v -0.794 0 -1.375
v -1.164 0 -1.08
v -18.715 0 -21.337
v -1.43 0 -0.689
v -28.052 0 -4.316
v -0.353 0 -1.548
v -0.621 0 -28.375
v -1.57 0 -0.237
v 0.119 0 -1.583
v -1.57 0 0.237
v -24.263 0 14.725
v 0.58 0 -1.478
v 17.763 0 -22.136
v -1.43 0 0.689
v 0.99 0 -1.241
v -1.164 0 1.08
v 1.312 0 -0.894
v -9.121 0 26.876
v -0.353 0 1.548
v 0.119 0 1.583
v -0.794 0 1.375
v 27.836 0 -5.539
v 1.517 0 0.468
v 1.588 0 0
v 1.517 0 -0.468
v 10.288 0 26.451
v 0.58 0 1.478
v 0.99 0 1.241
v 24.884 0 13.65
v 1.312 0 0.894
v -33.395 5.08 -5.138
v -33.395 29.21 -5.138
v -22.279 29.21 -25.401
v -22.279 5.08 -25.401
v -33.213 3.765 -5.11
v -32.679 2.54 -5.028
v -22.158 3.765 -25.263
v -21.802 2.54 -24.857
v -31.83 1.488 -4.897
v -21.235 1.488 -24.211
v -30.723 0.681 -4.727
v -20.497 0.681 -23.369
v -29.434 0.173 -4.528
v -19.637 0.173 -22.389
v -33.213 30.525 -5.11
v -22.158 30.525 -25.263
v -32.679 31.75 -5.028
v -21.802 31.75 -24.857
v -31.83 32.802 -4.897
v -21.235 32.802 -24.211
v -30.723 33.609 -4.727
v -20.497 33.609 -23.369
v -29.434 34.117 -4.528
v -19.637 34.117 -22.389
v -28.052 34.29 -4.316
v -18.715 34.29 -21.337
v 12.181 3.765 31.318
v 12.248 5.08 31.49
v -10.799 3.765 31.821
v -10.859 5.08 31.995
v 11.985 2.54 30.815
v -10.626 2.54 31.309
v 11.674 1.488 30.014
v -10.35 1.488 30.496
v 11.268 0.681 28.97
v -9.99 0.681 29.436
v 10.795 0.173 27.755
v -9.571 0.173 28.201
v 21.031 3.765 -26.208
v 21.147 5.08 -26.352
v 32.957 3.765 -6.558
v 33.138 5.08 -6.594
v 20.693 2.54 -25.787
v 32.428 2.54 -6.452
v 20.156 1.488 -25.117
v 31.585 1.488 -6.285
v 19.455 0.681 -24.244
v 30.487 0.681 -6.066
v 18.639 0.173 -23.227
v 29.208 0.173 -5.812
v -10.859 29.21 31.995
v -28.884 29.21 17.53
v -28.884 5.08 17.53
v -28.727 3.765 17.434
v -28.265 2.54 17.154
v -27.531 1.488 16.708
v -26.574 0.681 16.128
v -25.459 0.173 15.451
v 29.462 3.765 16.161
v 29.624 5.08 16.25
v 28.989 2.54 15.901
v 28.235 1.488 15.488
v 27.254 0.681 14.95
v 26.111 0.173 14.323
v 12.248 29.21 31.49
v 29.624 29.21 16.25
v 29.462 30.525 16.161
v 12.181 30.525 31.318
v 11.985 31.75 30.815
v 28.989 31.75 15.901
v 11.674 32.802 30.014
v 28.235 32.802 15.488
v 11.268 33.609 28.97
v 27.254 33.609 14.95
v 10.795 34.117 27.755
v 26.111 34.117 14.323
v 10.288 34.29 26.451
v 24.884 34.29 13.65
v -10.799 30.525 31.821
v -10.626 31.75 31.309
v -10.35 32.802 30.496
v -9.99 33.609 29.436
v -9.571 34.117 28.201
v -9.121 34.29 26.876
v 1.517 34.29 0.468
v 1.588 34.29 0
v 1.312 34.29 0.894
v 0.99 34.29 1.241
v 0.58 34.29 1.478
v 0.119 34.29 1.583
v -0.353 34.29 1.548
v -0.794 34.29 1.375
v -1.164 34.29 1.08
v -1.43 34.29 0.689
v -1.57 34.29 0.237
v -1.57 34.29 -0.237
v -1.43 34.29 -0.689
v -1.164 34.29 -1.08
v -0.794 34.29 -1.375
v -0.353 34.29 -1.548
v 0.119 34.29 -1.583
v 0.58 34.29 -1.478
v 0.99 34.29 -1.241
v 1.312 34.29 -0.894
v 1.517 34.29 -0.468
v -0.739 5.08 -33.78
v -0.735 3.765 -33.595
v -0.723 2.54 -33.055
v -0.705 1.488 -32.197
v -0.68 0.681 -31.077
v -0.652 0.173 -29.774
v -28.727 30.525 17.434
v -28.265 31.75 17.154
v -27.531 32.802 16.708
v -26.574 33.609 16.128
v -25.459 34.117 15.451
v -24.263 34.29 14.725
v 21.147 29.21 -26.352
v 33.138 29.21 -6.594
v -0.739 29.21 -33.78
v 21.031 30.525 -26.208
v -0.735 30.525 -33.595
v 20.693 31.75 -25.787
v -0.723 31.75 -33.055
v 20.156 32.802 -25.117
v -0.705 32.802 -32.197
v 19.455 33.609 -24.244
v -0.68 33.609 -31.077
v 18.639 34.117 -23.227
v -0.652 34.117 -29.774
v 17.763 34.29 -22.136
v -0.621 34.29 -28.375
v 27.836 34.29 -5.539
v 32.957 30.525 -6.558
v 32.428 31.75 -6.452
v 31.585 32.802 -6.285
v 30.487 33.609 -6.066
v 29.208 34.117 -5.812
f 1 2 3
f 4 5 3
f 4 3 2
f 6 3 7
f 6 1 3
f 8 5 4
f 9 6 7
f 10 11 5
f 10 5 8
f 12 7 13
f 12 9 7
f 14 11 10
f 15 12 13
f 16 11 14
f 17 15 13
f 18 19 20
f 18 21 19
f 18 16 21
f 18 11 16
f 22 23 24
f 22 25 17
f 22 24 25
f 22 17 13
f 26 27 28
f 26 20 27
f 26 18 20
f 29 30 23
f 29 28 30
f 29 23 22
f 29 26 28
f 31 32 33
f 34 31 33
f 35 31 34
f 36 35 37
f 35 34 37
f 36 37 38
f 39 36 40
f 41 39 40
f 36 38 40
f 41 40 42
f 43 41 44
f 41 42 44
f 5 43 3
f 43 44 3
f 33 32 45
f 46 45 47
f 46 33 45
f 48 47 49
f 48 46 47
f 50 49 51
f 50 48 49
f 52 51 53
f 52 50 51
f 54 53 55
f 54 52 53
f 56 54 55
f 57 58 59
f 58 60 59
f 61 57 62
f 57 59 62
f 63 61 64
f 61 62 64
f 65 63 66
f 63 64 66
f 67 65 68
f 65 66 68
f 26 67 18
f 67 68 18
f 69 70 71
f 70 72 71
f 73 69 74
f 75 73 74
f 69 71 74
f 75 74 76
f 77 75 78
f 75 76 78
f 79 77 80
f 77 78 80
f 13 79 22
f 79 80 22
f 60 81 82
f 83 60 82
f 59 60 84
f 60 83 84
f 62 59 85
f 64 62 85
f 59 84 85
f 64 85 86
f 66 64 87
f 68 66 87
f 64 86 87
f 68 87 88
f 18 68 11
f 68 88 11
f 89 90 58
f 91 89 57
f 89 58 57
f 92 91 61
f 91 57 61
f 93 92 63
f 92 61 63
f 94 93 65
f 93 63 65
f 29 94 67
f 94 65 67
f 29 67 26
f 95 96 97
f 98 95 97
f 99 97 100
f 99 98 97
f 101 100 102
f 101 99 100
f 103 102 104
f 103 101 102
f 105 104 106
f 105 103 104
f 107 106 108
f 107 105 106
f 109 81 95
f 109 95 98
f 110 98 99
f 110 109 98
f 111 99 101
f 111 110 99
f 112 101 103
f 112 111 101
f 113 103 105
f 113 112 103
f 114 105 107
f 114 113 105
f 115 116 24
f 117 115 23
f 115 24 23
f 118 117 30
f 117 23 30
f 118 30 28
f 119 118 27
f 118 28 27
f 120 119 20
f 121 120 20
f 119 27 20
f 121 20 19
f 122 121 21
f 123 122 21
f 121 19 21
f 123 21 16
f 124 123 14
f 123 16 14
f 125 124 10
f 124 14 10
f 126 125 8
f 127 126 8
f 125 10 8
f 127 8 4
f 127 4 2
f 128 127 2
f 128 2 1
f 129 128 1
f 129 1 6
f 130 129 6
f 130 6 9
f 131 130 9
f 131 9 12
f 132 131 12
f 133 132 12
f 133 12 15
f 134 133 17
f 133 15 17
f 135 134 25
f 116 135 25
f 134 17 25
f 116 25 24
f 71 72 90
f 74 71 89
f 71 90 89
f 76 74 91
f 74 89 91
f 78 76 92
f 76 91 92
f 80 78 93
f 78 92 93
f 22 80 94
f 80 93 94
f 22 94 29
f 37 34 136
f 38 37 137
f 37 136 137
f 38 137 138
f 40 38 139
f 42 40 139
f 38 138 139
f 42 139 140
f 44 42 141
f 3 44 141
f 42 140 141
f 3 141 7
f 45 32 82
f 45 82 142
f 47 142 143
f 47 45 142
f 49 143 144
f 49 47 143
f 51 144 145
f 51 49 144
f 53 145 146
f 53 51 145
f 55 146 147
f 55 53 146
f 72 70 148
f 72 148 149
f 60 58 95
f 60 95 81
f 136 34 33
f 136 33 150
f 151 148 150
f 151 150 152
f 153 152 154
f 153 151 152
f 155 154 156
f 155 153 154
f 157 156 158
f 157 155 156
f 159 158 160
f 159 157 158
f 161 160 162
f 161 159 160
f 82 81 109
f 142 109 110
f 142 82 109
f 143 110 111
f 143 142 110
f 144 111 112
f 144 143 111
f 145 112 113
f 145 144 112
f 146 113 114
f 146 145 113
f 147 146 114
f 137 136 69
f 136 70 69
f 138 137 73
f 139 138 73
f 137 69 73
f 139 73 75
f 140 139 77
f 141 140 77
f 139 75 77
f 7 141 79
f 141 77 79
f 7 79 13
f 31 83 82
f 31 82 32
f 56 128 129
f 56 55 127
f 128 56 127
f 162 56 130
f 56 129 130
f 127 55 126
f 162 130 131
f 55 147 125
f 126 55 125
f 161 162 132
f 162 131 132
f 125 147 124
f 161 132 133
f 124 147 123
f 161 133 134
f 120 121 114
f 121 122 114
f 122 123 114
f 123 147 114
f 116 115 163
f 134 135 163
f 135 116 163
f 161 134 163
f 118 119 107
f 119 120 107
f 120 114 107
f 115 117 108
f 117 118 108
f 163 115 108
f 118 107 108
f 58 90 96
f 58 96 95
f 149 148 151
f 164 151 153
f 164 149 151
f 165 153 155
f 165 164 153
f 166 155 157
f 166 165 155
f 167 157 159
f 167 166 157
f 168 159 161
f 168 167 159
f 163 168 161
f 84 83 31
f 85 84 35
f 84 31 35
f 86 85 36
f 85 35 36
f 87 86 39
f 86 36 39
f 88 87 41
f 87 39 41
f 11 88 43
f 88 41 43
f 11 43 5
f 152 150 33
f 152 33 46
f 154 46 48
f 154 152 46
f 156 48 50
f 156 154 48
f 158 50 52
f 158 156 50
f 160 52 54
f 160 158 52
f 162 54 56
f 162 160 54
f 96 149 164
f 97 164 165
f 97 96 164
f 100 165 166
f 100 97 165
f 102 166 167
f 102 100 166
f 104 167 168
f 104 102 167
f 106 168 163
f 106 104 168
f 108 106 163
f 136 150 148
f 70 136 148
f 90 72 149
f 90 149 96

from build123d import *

# Parameters (mm, degrees)
F0_R     = 1.5875
F1_DEPTH = 34.29
F2_R     = 5.08


with BuildPart() as f1:
    # F0 (on Front) → F1 (new body)
    with BuildSketch(Plane.XZ):
        Polygon((29.623586, 16.249556), (12.24797, 31.489556), (-10.858607, 31.995243), (-28.884321, 17.53), (-33.39474, -5.137725), (-22.27939, -25.401451), (-0.739265, -33.779556), (21.14677, -26.351831), (33.137997, -6.593792), align=None)
        Circle(F0_R, mode=Mode.SUBTRACT)
    extrude(amount=-F1_DEPTH)

    # F2
    f2_edges = [f1.edges().sort_by_distance(p)[0] for p in [
        (-31.139531, 0, 6.196138),
        (-27.837065, 0, -15.269588),
        (-19.871464, 0, 24.762621),
        (0.694682, 0, 31.742399),
        (20.935778, 0, 23.869556),
        (31.380791, 0, 4.827882),
        (27.142383, 0, -16.472812),
        (10.203753, 0, -30.065694),
        (-11.509327, 0, -29.590503),
        (27.142383, 34.29, -16.472812),
        (31.380791, 34.29, 4.827882),
        (20.935778, 34.29, 23.869556),
        (0.694682, 34.29, 31.742399),
        (-19.871464, 34.29, 24.762621),
        (-31.139531, 34.29, 6.196138),
        (-27.837065, 34.29, -15.269588),
        (-11.509327, 34.29, -29.590503),
        (10.203753, 34.29, -30.065694),
    ]]
    fillet(f2_edges, radius=F2_R)


solid = f1.part
